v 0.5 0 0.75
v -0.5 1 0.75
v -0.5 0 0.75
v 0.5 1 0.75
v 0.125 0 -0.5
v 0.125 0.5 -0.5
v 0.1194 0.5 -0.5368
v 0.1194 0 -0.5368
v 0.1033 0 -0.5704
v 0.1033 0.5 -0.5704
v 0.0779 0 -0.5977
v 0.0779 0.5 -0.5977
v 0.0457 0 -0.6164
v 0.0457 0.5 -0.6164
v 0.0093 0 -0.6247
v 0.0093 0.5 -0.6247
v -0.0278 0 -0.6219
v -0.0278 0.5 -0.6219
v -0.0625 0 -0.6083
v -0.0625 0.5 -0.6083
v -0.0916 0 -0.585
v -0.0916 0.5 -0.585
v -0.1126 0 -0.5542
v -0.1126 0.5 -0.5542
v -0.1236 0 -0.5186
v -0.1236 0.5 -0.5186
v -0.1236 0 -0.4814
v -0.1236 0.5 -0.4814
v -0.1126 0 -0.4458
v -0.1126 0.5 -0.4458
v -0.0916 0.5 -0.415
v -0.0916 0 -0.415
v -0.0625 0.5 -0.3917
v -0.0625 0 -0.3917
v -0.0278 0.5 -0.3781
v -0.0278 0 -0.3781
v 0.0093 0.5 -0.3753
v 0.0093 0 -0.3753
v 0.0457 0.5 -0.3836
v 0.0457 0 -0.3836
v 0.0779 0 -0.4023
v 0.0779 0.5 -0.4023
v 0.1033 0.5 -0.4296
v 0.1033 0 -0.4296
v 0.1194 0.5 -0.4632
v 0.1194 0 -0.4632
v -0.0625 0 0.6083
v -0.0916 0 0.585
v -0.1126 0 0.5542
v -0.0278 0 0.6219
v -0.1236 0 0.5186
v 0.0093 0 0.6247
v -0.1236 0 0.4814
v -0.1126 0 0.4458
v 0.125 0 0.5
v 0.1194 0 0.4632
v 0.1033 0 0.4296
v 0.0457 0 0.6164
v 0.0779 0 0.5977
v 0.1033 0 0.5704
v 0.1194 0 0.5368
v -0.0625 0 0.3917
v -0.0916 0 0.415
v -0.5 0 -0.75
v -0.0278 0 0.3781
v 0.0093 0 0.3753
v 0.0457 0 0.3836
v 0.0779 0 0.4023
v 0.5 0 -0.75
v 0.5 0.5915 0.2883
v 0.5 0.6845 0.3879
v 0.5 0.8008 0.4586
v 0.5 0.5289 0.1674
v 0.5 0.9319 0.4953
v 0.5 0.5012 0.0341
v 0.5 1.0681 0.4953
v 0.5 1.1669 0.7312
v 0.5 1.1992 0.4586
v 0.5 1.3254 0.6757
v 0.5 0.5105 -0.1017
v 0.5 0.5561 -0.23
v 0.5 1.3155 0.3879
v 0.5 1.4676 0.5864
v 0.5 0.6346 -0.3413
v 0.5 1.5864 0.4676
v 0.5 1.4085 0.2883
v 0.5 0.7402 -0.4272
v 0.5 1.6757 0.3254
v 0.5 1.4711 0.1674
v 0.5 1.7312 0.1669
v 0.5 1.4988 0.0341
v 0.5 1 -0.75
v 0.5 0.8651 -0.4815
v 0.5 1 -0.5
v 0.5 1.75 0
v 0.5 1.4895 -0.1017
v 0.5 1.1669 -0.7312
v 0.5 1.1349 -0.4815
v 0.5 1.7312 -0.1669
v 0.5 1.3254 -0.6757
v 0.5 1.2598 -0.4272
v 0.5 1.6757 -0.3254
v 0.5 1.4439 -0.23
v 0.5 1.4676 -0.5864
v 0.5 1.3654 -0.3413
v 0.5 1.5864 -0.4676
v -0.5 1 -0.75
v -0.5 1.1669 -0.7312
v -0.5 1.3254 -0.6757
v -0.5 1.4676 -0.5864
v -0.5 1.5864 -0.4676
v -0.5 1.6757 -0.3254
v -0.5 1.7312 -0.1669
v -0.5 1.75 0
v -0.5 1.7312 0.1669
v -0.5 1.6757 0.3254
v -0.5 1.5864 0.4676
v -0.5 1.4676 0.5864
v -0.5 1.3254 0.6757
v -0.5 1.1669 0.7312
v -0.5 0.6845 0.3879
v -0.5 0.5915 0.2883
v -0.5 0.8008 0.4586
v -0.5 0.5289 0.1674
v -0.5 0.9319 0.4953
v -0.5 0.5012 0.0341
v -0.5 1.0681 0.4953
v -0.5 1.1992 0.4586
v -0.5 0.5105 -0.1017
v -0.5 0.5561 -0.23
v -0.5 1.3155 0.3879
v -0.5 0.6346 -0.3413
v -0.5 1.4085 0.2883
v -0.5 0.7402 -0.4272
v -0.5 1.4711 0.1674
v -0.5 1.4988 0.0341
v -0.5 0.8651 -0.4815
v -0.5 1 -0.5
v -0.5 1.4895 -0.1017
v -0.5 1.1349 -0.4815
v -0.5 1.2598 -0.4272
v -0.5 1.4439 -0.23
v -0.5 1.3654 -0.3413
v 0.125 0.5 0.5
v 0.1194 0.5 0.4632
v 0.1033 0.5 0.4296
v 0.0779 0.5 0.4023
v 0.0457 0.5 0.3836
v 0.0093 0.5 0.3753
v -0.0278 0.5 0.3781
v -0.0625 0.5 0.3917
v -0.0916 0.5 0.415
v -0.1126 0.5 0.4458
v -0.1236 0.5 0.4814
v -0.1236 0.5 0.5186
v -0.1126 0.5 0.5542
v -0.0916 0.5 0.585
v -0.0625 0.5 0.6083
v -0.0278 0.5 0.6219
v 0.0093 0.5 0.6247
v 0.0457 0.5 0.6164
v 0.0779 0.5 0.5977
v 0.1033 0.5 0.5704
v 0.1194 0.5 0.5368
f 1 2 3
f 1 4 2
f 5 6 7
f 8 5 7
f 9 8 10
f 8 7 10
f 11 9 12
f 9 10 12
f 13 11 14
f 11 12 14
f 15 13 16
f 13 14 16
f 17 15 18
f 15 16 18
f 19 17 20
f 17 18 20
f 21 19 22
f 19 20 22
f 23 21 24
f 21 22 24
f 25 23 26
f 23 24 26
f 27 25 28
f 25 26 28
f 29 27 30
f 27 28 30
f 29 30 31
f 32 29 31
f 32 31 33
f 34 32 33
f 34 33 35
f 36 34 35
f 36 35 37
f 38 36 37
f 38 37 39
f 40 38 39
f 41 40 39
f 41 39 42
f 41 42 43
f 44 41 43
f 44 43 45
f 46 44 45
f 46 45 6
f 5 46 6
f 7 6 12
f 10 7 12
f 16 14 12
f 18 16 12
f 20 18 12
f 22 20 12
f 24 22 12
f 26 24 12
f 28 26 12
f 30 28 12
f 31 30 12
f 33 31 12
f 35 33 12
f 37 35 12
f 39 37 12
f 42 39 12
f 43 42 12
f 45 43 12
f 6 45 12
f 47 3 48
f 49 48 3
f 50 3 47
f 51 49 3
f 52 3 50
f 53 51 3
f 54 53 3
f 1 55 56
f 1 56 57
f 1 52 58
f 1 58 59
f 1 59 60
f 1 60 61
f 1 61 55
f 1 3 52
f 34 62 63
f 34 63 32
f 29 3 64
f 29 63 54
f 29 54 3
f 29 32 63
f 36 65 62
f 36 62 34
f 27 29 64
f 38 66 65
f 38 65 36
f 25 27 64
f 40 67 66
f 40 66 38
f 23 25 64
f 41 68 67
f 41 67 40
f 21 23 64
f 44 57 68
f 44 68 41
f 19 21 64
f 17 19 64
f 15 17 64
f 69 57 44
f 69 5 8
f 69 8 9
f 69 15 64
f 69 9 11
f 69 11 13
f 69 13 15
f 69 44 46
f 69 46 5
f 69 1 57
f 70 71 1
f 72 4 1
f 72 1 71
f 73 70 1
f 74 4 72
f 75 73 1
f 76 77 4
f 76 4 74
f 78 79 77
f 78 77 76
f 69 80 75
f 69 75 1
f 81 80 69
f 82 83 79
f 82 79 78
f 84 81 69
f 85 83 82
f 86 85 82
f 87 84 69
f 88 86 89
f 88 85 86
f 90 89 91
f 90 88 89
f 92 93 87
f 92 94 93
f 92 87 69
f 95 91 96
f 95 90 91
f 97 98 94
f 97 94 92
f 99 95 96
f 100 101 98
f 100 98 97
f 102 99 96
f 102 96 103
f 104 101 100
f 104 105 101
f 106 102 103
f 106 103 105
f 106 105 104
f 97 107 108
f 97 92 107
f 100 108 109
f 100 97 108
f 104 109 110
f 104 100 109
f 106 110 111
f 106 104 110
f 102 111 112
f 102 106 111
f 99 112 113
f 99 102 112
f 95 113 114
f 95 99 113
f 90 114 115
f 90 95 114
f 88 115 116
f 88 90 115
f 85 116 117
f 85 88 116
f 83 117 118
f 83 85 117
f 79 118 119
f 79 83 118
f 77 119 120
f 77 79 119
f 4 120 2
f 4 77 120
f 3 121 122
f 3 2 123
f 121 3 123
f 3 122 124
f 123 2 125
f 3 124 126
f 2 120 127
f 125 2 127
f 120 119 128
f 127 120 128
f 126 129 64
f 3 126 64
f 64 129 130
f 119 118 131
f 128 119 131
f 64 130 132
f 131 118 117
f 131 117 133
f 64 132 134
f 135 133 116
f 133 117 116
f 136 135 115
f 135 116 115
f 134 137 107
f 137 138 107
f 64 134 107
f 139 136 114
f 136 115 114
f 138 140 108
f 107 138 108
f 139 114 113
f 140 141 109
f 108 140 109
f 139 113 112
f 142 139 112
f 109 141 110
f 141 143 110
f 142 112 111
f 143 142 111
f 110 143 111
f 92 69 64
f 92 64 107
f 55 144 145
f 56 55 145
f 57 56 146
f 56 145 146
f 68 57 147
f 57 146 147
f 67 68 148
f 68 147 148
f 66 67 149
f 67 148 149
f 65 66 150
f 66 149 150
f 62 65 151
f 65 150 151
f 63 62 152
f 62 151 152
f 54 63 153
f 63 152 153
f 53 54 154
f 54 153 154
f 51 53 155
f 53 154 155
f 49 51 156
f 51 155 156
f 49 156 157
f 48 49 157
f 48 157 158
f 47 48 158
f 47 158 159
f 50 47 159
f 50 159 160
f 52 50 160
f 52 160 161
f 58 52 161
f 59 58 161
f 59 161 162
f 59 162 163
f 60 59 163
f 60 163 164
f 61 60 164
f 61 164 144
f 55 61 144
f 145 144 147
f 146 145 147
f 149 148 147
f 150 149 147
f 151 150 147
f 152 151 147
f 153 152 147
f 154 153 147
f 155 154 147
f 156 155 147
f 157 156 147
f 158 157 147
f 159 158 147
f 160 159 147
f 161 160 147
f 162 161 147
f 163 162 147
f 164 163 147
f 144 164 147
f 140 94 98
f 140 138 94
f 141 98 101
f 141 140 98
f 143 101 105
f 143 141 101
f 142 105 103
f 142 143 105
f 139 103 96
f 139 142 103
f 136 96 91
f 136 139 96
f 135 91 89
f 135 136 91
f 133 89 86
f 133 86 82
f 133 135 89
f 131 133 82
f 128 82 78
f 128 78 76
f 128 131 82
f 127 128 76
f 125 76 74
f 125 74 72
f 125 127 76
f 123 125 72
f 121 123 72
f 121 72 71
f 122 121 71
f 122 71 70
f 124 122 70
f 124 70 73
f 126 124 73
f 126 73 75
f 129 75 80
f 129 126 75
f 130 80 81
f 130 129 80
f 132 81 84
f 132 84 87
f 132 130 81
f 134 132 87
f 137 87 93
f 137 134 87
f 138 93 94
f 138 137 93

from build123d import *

# Parameters (mm, degrees)
SKETCH1_R           = 0.5
BOSS_EXTRUDE1_DEPTH = 0.5
HOLE1_D             = 0.25
HOLE1_DEPTH         = 0.5


with BuildPart() as part:
    # Sketch1 → Boss-Extrude1 (new, symmetric)
    with BuildSketch(Plane(origin=(0, 0, 0), x_dir=(0, 0, -1), z_dir=(1, 0, 0))):
        with BuildLine():
            Line((-0.75, 1), (-0.75, 0))
            Line((-0.75, 0), (0.75, 0))
            Line((0.75, 0), (0.75, 1))
            ThreePointArc((0.75, 1), (0, 1.75), (-0.75, 1))
        make_face()
        with Locations((0, 1)):
            Circle(SKETCH1_R, mode=Mode.SUBTRACT)
    extrude(amount=BOSS_EXTRUDE1_DEPTH, both=True)

    # Hole1
    with Locations(Plane(origin=(0, 0, 0), x_dir=(-1, 0, 0), z_dir=(0, -1, 0))):
        with Locations((0, -0.5), (0, 0.5)):
            Hole(HOLE1_D / 2, depth=HOLE1_DEPTH)


solid = part.part
